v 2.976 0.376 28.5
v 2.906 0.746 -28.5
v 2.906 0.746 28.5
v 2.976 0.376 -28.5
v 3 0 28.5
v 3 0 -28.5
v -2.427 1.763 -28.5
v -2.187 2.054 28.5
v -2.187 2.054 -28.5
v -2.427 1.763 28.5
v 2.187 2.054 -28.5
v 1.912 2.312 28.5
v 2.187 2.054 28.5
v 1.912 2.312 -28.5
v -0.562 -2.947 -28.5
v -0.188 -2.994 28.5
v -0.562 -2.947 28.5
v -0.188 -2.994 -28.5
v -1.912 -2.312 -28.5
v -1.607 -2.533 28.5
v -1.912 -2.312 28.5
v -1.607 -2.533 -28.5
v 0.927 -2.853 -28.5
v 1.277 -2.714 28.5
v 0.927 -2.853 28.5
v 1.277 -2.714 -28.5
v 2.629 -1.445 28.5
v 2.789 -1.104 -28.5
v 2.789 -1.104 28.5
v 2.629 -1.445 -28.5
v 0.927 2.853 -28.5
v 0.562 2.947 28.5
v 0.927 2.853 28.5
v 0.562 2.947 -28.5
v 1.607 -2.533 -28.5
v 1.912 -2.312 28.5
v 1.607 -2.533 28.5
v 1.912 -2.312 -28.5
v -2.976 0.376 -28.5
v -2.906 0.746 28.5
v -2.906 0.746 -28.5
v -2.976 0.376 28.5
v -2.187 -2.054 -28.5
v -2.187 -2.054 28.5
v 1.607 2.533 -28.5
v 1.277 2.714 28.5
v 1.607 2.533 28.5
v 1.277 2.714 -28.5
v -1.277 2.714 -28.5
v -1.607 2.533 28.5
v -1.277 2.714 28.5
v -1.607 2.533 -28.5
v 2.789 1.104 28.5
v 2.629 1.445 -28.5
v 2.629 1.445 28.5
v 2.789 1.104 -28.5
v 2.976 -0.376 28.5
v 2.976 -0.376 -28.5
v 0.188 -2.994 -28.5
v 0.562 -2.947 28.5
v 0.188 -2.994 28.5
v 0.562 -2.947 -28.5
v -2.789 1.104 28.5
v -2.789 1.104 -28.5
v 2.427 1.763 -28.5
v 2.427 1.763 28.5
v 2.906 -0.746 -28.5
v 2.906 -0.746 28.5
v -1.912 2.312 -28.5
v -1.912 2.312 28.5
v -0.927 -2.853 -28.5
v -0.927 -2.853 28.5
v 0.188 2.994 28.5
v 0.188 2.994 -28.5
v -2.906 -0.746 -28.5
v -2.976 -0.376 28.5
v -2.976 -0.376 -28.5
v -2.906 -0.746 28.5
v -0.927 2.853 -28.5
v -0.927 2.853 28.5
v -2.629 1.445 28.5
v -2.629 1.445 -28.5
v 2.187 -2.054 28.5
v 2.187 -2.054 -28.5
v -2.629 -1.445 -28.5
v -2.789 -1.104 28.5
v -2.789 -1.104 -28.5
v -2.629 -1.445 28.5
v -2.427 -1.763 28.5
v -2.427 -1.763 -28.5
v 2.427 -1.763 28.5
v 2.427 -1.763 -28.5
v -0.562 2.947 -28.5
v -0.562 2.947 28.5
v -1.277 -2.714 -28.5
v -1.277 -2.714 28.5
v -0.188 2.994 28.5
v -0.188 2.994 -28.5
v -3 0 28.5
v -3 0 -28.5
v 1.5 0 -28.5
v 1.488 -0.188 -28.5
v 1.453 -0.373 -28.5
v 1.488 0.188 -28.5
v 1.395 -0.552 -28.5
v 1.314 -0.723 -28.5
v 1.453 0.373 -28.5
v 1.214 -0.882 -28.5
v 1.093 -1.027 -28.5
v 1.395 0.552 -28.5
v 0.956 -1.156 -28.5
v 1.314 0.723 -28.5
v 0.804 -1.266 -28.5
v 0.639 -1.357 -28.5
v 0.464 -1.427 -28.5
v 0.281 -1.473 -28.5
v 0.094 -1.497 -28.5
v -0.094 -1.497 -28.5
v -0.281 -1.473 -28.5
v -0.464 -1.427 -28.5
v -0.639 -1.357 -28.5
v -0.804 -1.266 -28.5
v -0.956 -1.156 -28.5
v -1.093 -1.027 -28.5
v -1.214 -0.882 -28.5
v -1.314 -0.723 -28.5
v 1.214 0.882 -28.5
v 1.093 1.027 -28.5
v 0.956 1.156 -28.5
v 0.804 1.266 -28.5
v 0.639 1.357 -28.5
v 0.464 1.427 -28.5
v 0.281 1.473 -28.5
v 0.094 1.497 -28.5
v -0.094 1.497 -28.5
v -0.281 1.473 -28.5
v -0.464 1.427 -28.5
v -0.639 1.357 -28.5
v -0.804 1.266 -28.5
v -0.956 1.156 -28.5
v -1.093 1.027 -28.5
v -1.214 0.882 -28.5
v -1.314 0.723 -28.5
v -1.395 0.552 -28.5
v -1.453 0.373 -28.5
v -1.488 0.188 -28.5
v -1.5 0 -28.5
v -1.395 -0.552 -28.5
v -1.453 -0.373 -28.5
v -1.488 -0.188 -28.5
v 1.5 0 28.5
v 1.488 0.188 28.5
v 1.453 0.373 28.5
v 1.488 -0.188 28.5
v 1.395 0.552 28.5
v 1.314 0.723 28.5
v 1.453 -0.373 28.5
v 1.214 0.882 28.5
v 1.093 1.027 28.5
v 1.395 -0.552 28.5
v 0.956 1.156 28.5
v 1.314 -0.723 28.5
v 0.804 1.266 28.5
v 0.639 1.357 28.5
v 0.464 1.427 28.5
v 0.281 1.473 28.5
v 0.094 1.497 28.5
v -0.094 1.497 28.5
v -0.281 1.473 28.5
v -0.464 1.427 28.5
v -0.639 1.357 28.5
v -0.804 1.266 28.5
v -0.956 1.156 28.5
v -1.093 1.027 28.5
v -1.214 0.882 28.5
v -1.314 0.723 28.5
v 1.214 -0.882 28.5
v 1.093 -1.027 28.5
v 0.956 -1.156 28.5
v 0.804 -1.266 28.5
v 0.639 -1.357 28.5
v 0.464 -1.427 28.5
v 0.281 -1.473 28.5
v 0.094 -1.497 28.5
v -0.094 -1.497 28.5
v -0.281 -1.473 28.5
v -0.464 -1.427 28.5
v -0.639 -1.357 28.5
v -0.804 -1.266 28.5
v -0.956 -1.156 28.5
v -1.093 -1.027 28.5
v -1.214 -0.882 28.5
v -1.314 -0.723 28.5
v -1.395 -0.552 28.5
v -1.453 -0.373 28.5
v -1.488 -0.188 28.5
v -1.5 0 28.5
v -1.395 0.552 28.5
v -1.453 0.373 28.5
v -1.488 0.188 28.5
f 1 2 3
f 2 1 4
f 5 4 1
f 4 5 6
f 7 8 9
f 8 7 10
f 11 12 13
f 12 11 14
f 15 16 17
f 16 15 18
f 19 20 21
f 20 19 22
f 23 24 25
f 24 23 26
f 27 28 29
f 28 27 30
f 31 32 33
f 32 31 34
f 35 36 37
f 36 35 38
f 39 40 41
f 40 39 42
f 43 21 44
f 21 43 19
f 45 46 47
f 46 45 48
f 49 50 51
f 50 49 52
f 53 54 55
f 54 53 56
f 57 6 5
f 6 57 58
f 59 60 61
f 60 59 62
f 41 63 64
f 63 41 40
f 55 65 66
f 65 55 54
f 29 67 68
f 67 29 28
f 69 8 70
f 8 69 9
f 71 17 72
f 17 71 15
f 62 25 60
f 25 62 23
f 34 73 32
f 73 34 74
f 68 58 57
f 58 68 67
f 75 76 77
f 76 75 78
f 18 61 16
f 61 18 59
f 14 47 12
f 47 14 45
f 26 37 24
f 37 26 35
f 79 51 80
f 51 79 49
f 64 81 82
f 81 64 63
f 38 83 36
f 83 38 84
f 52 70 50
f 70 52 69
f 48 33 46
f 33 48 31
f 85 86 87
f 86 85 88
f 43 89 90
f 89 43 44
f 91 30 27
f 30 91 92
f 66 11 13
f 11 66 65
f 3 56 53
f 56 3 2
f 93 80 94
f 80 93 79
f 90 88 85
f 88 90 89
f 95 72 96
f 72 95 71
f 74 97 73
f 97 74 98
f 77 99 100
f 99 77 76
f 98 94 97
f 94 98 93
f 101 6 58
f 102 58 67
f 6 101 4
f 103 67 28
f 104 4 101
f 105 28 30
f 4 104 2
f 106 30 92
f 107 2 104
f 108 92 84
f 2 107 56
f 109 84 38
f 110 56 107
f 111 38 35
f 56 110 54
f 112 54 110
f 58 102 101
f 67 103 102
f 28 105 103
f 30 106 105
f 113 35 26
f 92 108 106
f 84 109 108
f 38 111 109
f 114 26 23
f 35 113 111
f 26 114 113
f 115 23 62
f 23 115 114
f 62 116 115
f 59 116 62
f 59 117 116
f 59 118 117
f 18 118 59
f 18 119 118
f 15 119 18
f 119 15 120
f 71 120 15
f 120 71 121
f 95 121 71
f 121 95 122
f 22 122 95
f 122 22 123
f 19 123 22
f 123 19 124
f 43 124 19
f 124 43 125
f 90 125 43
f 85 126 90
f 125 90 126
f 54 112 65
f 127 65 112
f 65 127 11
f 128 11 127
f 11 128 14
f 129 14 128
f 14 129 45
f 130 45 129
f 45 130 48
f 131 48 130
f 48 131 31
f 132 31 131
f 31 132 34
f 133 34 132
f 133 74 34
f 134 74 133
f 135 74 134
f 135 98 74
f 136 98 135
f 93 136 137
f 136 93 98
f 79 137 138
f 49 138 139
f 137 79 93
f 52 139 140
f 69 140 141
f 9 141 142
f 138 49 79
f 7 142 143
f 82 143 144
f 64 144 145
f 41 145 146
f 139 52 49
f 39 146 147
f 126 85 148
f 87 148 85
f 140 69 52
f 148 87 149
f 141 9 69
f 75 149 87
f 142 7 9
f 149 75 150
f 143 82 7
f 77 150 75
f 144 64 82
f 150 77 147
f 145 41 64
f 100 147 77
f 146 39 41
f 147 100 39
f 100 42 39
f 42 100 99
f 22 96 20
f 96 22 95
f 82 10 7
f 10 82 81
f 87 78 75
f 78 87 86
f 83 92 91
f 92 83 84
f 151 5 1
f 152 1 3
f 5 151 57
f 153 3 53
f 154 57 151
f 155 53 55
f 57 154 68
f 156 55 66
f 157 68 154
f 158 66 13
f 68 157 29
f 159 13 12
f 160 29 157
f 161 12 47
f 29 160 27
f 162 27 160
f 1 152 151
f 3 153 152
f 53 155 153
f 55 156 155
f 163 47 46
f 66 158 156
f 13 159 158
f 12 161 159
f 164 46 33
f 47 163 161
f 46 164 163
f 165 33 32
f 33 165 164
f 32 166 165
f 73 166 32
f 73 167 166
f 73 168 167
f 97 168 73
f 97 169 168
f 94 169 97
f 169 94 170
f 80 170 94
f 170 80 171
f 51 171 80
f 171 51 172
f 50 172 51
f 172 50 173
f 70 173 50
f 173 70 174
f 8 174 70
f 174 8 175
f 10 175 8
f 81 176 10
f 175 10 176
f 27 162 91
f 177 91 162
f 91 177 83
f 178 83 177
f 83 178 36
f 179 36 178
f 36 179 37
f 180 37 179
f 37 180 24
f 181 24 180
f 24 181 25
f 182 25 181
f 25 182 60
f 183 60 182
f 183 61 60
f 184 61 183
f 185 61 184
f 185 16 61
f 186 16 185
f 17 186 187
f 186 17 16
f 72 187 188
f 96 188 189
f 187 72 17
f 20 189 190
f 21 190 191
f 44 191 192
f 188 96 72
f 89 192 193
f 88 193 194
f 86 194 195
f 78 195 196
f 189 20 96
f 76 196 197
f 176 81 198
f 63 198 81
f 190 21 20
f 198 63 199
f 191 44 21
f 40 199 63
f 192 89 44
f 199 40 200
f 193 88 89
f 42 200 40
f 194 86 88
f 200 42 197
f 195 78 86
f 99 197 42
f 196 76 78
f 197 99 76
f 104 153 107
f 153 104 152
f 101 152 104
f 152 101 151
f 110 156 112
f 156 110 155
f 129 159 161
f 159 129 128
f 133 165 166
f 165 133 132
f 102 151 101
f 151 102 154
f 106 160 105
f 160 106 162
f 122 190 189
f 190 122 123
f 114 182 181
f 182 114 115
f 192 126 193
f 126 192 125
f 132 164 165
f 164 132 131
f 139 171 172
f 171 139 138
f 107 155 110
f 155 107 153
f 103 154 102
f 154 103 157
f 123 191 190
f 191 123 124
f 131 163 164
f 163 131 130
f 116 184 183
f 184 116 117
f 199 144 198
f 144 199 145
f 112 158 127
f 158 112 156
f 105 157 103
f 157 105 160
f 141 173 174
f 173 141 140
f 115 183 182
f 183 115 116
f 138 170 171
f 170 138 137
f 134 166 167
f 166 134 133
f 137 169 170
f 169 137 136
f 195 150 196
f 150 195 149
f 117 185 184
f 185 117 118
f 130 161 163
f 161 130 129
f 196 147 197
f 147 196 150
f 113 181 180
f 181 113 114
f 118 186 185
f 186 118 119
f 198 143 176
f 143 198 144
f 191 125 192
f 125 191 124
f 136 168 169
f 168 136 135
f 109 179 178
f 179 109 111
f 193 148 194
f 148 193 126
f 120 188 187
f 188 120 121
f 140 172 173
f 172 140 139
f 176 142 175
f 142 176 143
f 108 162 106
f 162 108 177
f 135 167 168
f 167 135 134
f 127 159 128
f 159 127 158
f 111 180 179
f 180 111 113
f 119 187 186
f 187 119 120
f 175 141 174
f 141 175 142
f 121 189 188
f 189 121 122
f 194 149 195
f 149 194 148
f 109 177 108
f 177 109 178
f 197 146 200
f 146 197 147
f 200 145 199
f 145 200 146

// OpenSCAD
$fn = 50;


difference() {
	union() {
		translate(v = [0, 0, -28.5000000000]) {
			cylinder(h = 57, r = 3.0000000000);
		}
	}
	union() {
		translate(v = [0, 0, -100.0000000000]) {
			cylinder(h = 200, r = 1.5000000000);
		}
	}
}
